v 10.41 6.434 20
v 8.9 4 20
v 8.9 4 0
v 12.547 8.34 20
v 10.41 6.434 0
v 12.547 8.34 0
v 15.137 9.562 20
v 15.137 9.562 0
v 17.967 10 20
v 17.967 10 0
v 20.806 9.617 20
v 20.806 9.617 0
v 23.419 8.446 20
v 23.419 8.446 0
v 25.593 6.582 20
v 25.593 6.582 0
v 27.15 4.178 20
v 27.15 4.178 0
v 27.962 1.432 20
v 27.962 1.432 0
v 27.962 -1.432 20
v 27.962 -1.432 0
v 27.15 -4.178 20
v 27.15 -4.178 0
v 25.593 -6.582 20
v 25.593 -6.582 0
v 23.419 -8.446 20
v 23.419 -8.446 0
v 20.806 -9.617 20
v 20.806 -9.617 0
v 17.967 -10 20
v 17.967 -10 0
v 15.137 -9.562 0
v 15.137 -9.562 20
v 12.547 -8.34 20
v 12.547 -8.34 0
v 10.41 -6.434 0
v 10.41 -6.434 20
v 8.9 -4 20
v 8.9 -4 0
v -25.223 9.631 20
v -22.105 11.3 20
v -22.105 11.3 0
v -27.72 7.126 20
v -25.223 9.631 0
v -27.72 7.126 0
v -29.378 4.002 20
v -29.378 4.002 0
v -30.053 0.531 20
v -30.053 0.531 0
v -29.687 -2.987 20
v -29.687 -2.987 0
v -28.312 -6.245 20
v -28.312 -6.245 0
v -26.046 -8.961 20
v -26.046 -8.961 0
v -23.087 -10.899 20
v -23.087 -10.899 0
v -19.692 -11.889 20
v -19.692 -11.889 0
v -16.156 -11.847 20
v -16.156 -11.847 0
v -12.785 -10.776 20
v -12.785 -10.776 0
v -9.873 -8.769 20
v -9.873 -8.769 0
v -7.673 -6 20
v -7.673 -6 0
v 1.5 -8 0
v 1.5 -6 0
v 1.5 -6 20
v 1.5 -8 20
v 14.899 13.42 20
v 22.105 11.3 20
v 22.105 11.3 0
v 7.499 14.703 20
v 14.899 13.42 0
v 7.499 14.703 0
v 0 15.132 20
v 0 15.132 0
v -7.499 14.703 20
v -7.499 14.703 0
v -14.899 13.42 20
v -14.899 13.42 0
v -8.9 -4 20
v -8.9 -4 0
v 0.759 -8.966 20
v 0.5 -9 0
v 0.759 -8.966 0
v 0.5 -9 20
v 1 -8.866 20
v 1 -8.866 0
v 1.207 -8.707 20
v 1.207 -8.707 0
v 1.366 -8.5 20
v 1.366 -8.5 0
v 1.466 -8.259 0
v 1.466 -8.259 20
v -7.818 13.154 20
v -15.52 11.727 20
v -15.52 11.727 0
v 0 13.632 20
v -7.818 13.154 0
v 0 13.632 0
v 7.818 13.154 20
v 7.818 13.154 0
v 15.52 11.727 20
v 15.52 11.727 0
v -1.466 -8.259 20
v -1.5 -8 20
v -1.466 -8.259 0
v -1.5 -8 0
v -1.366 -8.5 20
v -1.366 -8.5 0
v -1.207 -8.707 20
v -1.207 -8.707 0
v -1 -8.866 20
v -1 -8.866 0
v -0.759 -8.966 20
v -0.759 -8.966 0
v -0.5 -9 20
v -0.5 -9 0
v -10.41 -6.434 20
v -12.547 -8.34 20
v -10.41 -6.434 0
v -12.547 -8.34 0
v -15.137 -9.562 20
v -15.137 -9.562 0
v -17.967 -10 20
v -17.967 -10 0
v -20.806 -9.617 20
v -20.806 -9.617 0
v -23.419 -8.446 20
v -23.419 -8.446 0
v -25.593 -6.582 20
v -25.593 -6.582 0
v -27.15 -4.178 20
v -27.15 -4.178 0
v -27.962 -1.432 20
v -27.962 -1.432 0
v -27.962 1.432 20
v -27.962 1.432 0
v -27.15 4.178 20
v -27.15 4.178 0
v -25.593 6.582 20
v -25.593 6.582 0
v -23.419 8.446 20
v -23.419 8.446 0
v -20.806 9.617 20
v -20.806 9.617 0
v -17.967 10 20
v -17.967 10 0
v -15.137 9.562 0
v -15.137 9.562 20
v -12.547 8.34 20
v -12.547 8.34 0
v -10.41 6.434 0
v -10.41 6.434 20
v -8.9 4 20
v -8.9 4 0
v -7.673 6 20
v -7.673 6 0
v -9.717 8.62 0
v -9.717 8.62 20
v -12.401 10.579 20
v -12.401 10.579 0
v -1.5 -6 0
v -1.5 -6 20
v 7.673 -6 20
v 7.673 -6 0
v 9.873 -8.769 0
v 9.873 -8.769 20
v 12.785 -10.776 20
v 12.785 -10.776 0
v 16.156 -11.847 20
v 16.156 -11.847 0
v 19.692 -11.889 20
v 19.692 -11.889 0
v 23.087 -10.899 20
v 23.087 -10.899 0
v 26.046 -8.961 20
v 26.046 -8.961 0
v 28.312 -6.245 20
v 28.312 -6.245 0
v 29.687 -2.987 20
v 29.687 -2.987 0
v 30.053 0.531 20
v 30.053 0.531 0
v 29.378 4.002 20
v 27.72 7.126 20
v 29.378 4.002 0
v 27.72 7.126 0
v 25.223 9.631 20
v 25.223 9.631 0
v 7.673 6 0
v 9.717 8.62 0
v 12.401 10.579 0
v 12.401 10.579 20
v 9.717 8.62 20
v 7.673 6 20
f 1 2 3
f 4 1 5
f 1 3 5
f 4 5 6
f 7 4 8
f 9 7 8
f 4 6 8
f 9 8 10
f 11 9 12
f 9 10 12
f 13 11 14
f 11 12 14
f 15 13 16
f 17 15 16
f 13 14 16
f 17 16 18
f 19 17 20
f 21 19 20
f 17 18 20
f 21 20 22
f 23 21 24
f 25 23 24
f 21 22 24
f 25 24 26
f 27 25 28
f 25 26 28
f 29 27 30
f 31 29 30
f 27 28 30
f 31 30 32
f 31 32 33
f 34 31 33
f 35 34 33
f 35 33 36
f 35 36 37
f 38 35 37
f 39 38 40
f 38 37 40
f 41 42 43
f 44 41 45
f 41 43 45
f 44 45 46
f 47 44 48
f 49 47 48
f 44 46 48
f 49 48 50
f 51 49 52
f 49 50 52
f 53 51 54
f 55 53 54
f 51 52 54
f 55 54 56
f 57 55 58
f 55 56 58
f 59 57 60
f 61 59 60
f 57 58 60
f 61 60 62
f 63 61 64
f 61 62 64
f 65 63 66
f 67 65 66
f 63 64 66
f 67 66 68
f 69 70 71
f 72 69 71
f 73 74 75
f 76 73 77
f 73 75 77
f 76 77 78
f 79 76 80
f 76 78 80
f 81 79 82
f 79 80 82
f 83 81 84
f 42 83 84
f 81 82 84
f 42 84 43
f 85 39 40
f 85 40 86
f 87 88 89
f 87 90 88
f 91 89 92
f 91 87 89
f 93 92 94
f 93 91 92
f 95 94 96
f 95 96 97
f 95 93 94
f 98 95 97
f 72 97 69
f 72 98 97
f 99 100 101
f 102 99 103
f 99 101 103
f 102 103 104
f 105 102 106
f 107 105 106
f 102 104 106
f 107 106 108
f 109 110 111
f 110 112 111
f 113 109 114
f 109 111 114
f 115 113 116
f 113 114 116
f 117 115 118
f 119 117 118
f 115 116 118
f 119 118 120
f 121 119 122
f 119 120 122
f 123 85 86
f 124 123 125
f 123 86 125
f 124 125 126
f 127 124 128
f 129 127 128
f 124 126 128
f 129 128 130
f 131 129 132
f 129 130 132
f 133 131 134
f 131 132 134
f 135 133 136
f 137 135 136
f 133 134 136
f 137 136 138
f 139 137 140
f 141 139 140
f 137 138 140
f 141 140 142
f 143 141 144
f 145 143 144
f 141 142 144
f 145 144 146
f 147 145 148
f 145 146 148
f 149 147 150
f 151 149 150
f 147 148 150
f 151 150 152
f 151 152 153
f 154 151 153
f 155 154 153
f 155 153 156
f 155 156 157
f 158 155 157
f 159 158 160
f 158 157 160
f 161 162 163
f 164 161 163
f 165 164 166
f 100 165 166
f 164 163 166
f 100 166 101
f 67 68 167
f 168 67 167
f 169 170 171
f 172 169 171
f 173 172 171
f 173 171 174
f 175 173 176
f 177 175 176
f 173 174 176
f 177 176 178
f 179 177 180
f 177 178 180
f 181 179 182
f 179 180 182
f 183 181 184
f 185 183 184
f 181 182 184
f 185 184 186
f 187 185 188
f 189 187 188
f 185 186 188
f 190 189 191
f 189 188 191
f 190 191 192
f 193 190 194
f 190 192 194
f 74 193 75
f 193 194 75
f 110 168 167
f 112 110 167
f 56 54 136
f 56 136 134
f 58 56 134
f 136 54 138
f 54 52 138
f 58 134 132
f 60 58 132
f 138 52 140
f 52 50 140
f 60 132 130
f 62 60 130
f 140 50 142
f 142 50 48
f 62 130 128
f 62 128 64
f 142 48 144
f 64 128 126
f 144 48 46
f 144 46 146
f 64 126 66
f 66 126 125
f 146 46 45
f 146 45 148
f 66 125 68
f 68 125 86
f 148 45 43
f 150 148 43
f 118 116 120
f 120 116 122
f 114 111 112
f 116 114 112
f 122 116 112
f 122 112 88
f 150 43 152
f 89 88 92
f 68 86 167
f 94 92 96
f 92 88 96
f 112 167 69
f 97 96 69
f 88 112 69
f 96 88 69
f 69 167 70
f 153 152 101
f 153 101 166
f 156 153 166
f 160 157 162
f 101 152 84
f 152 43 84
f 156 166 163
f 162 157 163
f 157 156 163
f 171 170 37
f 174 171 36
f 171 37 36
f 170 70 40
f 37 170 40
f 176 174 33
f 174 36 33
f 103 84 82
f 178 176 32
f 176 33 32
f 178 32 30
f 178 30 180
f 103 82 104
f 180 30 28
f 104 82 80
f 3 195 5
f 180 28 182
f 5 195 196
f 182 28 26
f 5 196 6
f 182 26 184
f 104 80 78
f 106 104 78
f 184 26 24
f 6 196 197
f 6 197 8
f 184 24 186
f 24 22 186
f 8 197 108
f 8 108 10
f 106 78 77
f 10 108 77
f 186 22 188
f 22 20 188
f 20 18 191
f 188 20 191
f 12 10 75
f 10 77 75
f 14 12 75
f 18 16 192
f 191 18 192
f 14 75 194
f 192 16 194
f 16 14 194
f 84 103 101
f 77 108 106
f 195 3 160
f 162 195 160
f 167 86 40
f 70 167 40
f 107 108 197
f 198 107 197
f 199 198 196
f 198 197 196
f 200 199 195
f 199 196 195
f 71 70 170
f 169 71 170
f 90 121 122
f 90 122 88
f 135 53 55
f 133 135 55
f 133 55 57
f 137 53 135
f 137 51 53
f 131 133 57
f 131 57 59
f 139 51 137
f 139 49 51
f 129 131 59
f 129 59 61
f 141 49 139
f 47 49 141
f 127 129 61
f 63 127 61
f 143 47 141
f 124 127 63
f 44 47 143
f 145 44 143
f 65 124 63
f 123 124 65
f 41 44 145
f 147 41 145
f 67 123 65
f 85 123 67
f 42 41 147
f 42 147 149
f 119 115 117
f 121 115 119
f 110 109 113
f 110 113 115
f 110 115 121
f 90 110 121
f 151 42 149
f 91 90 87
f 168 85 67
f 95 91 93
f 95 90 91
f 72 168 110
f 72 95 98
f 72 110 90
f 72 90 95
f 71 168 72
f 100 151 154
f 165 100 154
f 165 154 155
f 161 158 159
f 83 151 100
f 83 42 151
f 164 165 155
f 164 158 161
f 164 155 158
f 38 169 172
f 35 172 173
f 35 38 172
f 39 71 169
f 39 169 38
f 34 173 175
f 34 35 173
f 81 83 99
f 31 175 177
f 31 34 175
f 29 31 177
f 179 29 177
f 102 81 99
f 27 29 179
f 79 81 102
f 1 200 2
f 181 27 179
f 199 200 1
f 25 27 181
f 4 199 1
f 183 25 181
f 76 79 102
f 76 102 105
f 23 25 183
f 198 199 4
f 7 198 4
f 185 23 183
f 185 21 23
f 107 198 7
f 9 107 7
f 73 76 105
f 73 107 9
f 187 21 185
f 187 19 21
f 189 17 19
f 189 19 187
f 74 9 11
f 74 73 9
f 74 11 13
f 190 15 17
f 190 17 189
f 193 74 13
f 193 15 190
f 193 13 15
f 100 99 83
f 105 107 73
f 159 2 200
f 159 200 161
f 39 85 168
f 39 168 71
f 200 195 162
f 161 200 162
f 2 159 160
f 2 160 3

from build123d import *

# Parameters (mm, degrees)
F1_DEPTH = 20
F3_DEPTH = 3
F4_R     = 1


with BuildPart() as f1:
    # F0 (on Top) → F1 (new body)
    with BuildSketch(Plane.XY):
        with BuildLine():
            ThreePointArc((-22.105041, 11.299526), (-27.279634, -7.687217), (-7.672847, -6))
            Line((-7.672847, -6), (7.672847, -6))
            ThreePointArc((7.672847, -6), (27.279634, -7.687217), (22.105041, 11.299526))
            ThreePointArc((22.105041, 11.299526), (18.842402, 11.974802), (15.519847, 11.726953))
            ThreePointArc((15.519847, 11.726953), (10.990907, 9.693042), (7.672847, 6))
            Line((7.672847, 6), (-1.3, 6))
            Line((-1.3, 6), (-7.672847, 6))
            ThreePointArc((-7.672847, 6), (-10.990907, 9.693042), (-15.519847, 11.726953))
            ThreePointArc((-15.519847, 11.726953), (-18.842402, 11.974802), (-22.105041, 11.299526))
        make_face()
        with BuildLine():
            Line((-8.9, 4), (0, 4))
            Line((0, 4), (8.9, 4))
            ThreePointArc((8.9, 4), (28.065151, 0), (8.9, -4))
            Line((8.9, -4), (-8.9, -4))
            ThreePointArc((-8.9, -4), (-28.065151, 0), (-8.9, 4))
        make_face(mode=Mode.SUBTRACT)
        with BuildLine():
            ThreePointArc((22.105041, 11.299526), (0, 15.132305), (-22.105041, 11.299526))
            ThreePointArc((-22.105041, 11.299526), (-18.842402, 11.974802), (-15.519847, 11.726953))
            ThreePointArc((-15.519847, 11.726953), (0, 13.632305), (15.519847, 11.726953))
            ThreePointArc((15.519847, 11.726953), (18.842402, 11.974802), (22.105041, 11.299526))
        make_face()
    extrude(amount=F1_DEPTH)

    # F2 (on face) → F3 (join)
    with BuildSketch(Plane.XZ.offset(6)):
        Polygon((1.5, 20), (0, 20), (-1.5, 20), (-1.5, 0), (0, 0), (1.5, 0), align=None)
    extrude(amount=F3_DEPTH)

    # F4
    f4_edges = [f1.edges().sort_by_distance(p)[0] for p in [
        (1.5, -9, 10),
        (-1.5, -9, 10),
    ]]
    fillet(f4_edges, radius=F4_R)


solid = f1.part
